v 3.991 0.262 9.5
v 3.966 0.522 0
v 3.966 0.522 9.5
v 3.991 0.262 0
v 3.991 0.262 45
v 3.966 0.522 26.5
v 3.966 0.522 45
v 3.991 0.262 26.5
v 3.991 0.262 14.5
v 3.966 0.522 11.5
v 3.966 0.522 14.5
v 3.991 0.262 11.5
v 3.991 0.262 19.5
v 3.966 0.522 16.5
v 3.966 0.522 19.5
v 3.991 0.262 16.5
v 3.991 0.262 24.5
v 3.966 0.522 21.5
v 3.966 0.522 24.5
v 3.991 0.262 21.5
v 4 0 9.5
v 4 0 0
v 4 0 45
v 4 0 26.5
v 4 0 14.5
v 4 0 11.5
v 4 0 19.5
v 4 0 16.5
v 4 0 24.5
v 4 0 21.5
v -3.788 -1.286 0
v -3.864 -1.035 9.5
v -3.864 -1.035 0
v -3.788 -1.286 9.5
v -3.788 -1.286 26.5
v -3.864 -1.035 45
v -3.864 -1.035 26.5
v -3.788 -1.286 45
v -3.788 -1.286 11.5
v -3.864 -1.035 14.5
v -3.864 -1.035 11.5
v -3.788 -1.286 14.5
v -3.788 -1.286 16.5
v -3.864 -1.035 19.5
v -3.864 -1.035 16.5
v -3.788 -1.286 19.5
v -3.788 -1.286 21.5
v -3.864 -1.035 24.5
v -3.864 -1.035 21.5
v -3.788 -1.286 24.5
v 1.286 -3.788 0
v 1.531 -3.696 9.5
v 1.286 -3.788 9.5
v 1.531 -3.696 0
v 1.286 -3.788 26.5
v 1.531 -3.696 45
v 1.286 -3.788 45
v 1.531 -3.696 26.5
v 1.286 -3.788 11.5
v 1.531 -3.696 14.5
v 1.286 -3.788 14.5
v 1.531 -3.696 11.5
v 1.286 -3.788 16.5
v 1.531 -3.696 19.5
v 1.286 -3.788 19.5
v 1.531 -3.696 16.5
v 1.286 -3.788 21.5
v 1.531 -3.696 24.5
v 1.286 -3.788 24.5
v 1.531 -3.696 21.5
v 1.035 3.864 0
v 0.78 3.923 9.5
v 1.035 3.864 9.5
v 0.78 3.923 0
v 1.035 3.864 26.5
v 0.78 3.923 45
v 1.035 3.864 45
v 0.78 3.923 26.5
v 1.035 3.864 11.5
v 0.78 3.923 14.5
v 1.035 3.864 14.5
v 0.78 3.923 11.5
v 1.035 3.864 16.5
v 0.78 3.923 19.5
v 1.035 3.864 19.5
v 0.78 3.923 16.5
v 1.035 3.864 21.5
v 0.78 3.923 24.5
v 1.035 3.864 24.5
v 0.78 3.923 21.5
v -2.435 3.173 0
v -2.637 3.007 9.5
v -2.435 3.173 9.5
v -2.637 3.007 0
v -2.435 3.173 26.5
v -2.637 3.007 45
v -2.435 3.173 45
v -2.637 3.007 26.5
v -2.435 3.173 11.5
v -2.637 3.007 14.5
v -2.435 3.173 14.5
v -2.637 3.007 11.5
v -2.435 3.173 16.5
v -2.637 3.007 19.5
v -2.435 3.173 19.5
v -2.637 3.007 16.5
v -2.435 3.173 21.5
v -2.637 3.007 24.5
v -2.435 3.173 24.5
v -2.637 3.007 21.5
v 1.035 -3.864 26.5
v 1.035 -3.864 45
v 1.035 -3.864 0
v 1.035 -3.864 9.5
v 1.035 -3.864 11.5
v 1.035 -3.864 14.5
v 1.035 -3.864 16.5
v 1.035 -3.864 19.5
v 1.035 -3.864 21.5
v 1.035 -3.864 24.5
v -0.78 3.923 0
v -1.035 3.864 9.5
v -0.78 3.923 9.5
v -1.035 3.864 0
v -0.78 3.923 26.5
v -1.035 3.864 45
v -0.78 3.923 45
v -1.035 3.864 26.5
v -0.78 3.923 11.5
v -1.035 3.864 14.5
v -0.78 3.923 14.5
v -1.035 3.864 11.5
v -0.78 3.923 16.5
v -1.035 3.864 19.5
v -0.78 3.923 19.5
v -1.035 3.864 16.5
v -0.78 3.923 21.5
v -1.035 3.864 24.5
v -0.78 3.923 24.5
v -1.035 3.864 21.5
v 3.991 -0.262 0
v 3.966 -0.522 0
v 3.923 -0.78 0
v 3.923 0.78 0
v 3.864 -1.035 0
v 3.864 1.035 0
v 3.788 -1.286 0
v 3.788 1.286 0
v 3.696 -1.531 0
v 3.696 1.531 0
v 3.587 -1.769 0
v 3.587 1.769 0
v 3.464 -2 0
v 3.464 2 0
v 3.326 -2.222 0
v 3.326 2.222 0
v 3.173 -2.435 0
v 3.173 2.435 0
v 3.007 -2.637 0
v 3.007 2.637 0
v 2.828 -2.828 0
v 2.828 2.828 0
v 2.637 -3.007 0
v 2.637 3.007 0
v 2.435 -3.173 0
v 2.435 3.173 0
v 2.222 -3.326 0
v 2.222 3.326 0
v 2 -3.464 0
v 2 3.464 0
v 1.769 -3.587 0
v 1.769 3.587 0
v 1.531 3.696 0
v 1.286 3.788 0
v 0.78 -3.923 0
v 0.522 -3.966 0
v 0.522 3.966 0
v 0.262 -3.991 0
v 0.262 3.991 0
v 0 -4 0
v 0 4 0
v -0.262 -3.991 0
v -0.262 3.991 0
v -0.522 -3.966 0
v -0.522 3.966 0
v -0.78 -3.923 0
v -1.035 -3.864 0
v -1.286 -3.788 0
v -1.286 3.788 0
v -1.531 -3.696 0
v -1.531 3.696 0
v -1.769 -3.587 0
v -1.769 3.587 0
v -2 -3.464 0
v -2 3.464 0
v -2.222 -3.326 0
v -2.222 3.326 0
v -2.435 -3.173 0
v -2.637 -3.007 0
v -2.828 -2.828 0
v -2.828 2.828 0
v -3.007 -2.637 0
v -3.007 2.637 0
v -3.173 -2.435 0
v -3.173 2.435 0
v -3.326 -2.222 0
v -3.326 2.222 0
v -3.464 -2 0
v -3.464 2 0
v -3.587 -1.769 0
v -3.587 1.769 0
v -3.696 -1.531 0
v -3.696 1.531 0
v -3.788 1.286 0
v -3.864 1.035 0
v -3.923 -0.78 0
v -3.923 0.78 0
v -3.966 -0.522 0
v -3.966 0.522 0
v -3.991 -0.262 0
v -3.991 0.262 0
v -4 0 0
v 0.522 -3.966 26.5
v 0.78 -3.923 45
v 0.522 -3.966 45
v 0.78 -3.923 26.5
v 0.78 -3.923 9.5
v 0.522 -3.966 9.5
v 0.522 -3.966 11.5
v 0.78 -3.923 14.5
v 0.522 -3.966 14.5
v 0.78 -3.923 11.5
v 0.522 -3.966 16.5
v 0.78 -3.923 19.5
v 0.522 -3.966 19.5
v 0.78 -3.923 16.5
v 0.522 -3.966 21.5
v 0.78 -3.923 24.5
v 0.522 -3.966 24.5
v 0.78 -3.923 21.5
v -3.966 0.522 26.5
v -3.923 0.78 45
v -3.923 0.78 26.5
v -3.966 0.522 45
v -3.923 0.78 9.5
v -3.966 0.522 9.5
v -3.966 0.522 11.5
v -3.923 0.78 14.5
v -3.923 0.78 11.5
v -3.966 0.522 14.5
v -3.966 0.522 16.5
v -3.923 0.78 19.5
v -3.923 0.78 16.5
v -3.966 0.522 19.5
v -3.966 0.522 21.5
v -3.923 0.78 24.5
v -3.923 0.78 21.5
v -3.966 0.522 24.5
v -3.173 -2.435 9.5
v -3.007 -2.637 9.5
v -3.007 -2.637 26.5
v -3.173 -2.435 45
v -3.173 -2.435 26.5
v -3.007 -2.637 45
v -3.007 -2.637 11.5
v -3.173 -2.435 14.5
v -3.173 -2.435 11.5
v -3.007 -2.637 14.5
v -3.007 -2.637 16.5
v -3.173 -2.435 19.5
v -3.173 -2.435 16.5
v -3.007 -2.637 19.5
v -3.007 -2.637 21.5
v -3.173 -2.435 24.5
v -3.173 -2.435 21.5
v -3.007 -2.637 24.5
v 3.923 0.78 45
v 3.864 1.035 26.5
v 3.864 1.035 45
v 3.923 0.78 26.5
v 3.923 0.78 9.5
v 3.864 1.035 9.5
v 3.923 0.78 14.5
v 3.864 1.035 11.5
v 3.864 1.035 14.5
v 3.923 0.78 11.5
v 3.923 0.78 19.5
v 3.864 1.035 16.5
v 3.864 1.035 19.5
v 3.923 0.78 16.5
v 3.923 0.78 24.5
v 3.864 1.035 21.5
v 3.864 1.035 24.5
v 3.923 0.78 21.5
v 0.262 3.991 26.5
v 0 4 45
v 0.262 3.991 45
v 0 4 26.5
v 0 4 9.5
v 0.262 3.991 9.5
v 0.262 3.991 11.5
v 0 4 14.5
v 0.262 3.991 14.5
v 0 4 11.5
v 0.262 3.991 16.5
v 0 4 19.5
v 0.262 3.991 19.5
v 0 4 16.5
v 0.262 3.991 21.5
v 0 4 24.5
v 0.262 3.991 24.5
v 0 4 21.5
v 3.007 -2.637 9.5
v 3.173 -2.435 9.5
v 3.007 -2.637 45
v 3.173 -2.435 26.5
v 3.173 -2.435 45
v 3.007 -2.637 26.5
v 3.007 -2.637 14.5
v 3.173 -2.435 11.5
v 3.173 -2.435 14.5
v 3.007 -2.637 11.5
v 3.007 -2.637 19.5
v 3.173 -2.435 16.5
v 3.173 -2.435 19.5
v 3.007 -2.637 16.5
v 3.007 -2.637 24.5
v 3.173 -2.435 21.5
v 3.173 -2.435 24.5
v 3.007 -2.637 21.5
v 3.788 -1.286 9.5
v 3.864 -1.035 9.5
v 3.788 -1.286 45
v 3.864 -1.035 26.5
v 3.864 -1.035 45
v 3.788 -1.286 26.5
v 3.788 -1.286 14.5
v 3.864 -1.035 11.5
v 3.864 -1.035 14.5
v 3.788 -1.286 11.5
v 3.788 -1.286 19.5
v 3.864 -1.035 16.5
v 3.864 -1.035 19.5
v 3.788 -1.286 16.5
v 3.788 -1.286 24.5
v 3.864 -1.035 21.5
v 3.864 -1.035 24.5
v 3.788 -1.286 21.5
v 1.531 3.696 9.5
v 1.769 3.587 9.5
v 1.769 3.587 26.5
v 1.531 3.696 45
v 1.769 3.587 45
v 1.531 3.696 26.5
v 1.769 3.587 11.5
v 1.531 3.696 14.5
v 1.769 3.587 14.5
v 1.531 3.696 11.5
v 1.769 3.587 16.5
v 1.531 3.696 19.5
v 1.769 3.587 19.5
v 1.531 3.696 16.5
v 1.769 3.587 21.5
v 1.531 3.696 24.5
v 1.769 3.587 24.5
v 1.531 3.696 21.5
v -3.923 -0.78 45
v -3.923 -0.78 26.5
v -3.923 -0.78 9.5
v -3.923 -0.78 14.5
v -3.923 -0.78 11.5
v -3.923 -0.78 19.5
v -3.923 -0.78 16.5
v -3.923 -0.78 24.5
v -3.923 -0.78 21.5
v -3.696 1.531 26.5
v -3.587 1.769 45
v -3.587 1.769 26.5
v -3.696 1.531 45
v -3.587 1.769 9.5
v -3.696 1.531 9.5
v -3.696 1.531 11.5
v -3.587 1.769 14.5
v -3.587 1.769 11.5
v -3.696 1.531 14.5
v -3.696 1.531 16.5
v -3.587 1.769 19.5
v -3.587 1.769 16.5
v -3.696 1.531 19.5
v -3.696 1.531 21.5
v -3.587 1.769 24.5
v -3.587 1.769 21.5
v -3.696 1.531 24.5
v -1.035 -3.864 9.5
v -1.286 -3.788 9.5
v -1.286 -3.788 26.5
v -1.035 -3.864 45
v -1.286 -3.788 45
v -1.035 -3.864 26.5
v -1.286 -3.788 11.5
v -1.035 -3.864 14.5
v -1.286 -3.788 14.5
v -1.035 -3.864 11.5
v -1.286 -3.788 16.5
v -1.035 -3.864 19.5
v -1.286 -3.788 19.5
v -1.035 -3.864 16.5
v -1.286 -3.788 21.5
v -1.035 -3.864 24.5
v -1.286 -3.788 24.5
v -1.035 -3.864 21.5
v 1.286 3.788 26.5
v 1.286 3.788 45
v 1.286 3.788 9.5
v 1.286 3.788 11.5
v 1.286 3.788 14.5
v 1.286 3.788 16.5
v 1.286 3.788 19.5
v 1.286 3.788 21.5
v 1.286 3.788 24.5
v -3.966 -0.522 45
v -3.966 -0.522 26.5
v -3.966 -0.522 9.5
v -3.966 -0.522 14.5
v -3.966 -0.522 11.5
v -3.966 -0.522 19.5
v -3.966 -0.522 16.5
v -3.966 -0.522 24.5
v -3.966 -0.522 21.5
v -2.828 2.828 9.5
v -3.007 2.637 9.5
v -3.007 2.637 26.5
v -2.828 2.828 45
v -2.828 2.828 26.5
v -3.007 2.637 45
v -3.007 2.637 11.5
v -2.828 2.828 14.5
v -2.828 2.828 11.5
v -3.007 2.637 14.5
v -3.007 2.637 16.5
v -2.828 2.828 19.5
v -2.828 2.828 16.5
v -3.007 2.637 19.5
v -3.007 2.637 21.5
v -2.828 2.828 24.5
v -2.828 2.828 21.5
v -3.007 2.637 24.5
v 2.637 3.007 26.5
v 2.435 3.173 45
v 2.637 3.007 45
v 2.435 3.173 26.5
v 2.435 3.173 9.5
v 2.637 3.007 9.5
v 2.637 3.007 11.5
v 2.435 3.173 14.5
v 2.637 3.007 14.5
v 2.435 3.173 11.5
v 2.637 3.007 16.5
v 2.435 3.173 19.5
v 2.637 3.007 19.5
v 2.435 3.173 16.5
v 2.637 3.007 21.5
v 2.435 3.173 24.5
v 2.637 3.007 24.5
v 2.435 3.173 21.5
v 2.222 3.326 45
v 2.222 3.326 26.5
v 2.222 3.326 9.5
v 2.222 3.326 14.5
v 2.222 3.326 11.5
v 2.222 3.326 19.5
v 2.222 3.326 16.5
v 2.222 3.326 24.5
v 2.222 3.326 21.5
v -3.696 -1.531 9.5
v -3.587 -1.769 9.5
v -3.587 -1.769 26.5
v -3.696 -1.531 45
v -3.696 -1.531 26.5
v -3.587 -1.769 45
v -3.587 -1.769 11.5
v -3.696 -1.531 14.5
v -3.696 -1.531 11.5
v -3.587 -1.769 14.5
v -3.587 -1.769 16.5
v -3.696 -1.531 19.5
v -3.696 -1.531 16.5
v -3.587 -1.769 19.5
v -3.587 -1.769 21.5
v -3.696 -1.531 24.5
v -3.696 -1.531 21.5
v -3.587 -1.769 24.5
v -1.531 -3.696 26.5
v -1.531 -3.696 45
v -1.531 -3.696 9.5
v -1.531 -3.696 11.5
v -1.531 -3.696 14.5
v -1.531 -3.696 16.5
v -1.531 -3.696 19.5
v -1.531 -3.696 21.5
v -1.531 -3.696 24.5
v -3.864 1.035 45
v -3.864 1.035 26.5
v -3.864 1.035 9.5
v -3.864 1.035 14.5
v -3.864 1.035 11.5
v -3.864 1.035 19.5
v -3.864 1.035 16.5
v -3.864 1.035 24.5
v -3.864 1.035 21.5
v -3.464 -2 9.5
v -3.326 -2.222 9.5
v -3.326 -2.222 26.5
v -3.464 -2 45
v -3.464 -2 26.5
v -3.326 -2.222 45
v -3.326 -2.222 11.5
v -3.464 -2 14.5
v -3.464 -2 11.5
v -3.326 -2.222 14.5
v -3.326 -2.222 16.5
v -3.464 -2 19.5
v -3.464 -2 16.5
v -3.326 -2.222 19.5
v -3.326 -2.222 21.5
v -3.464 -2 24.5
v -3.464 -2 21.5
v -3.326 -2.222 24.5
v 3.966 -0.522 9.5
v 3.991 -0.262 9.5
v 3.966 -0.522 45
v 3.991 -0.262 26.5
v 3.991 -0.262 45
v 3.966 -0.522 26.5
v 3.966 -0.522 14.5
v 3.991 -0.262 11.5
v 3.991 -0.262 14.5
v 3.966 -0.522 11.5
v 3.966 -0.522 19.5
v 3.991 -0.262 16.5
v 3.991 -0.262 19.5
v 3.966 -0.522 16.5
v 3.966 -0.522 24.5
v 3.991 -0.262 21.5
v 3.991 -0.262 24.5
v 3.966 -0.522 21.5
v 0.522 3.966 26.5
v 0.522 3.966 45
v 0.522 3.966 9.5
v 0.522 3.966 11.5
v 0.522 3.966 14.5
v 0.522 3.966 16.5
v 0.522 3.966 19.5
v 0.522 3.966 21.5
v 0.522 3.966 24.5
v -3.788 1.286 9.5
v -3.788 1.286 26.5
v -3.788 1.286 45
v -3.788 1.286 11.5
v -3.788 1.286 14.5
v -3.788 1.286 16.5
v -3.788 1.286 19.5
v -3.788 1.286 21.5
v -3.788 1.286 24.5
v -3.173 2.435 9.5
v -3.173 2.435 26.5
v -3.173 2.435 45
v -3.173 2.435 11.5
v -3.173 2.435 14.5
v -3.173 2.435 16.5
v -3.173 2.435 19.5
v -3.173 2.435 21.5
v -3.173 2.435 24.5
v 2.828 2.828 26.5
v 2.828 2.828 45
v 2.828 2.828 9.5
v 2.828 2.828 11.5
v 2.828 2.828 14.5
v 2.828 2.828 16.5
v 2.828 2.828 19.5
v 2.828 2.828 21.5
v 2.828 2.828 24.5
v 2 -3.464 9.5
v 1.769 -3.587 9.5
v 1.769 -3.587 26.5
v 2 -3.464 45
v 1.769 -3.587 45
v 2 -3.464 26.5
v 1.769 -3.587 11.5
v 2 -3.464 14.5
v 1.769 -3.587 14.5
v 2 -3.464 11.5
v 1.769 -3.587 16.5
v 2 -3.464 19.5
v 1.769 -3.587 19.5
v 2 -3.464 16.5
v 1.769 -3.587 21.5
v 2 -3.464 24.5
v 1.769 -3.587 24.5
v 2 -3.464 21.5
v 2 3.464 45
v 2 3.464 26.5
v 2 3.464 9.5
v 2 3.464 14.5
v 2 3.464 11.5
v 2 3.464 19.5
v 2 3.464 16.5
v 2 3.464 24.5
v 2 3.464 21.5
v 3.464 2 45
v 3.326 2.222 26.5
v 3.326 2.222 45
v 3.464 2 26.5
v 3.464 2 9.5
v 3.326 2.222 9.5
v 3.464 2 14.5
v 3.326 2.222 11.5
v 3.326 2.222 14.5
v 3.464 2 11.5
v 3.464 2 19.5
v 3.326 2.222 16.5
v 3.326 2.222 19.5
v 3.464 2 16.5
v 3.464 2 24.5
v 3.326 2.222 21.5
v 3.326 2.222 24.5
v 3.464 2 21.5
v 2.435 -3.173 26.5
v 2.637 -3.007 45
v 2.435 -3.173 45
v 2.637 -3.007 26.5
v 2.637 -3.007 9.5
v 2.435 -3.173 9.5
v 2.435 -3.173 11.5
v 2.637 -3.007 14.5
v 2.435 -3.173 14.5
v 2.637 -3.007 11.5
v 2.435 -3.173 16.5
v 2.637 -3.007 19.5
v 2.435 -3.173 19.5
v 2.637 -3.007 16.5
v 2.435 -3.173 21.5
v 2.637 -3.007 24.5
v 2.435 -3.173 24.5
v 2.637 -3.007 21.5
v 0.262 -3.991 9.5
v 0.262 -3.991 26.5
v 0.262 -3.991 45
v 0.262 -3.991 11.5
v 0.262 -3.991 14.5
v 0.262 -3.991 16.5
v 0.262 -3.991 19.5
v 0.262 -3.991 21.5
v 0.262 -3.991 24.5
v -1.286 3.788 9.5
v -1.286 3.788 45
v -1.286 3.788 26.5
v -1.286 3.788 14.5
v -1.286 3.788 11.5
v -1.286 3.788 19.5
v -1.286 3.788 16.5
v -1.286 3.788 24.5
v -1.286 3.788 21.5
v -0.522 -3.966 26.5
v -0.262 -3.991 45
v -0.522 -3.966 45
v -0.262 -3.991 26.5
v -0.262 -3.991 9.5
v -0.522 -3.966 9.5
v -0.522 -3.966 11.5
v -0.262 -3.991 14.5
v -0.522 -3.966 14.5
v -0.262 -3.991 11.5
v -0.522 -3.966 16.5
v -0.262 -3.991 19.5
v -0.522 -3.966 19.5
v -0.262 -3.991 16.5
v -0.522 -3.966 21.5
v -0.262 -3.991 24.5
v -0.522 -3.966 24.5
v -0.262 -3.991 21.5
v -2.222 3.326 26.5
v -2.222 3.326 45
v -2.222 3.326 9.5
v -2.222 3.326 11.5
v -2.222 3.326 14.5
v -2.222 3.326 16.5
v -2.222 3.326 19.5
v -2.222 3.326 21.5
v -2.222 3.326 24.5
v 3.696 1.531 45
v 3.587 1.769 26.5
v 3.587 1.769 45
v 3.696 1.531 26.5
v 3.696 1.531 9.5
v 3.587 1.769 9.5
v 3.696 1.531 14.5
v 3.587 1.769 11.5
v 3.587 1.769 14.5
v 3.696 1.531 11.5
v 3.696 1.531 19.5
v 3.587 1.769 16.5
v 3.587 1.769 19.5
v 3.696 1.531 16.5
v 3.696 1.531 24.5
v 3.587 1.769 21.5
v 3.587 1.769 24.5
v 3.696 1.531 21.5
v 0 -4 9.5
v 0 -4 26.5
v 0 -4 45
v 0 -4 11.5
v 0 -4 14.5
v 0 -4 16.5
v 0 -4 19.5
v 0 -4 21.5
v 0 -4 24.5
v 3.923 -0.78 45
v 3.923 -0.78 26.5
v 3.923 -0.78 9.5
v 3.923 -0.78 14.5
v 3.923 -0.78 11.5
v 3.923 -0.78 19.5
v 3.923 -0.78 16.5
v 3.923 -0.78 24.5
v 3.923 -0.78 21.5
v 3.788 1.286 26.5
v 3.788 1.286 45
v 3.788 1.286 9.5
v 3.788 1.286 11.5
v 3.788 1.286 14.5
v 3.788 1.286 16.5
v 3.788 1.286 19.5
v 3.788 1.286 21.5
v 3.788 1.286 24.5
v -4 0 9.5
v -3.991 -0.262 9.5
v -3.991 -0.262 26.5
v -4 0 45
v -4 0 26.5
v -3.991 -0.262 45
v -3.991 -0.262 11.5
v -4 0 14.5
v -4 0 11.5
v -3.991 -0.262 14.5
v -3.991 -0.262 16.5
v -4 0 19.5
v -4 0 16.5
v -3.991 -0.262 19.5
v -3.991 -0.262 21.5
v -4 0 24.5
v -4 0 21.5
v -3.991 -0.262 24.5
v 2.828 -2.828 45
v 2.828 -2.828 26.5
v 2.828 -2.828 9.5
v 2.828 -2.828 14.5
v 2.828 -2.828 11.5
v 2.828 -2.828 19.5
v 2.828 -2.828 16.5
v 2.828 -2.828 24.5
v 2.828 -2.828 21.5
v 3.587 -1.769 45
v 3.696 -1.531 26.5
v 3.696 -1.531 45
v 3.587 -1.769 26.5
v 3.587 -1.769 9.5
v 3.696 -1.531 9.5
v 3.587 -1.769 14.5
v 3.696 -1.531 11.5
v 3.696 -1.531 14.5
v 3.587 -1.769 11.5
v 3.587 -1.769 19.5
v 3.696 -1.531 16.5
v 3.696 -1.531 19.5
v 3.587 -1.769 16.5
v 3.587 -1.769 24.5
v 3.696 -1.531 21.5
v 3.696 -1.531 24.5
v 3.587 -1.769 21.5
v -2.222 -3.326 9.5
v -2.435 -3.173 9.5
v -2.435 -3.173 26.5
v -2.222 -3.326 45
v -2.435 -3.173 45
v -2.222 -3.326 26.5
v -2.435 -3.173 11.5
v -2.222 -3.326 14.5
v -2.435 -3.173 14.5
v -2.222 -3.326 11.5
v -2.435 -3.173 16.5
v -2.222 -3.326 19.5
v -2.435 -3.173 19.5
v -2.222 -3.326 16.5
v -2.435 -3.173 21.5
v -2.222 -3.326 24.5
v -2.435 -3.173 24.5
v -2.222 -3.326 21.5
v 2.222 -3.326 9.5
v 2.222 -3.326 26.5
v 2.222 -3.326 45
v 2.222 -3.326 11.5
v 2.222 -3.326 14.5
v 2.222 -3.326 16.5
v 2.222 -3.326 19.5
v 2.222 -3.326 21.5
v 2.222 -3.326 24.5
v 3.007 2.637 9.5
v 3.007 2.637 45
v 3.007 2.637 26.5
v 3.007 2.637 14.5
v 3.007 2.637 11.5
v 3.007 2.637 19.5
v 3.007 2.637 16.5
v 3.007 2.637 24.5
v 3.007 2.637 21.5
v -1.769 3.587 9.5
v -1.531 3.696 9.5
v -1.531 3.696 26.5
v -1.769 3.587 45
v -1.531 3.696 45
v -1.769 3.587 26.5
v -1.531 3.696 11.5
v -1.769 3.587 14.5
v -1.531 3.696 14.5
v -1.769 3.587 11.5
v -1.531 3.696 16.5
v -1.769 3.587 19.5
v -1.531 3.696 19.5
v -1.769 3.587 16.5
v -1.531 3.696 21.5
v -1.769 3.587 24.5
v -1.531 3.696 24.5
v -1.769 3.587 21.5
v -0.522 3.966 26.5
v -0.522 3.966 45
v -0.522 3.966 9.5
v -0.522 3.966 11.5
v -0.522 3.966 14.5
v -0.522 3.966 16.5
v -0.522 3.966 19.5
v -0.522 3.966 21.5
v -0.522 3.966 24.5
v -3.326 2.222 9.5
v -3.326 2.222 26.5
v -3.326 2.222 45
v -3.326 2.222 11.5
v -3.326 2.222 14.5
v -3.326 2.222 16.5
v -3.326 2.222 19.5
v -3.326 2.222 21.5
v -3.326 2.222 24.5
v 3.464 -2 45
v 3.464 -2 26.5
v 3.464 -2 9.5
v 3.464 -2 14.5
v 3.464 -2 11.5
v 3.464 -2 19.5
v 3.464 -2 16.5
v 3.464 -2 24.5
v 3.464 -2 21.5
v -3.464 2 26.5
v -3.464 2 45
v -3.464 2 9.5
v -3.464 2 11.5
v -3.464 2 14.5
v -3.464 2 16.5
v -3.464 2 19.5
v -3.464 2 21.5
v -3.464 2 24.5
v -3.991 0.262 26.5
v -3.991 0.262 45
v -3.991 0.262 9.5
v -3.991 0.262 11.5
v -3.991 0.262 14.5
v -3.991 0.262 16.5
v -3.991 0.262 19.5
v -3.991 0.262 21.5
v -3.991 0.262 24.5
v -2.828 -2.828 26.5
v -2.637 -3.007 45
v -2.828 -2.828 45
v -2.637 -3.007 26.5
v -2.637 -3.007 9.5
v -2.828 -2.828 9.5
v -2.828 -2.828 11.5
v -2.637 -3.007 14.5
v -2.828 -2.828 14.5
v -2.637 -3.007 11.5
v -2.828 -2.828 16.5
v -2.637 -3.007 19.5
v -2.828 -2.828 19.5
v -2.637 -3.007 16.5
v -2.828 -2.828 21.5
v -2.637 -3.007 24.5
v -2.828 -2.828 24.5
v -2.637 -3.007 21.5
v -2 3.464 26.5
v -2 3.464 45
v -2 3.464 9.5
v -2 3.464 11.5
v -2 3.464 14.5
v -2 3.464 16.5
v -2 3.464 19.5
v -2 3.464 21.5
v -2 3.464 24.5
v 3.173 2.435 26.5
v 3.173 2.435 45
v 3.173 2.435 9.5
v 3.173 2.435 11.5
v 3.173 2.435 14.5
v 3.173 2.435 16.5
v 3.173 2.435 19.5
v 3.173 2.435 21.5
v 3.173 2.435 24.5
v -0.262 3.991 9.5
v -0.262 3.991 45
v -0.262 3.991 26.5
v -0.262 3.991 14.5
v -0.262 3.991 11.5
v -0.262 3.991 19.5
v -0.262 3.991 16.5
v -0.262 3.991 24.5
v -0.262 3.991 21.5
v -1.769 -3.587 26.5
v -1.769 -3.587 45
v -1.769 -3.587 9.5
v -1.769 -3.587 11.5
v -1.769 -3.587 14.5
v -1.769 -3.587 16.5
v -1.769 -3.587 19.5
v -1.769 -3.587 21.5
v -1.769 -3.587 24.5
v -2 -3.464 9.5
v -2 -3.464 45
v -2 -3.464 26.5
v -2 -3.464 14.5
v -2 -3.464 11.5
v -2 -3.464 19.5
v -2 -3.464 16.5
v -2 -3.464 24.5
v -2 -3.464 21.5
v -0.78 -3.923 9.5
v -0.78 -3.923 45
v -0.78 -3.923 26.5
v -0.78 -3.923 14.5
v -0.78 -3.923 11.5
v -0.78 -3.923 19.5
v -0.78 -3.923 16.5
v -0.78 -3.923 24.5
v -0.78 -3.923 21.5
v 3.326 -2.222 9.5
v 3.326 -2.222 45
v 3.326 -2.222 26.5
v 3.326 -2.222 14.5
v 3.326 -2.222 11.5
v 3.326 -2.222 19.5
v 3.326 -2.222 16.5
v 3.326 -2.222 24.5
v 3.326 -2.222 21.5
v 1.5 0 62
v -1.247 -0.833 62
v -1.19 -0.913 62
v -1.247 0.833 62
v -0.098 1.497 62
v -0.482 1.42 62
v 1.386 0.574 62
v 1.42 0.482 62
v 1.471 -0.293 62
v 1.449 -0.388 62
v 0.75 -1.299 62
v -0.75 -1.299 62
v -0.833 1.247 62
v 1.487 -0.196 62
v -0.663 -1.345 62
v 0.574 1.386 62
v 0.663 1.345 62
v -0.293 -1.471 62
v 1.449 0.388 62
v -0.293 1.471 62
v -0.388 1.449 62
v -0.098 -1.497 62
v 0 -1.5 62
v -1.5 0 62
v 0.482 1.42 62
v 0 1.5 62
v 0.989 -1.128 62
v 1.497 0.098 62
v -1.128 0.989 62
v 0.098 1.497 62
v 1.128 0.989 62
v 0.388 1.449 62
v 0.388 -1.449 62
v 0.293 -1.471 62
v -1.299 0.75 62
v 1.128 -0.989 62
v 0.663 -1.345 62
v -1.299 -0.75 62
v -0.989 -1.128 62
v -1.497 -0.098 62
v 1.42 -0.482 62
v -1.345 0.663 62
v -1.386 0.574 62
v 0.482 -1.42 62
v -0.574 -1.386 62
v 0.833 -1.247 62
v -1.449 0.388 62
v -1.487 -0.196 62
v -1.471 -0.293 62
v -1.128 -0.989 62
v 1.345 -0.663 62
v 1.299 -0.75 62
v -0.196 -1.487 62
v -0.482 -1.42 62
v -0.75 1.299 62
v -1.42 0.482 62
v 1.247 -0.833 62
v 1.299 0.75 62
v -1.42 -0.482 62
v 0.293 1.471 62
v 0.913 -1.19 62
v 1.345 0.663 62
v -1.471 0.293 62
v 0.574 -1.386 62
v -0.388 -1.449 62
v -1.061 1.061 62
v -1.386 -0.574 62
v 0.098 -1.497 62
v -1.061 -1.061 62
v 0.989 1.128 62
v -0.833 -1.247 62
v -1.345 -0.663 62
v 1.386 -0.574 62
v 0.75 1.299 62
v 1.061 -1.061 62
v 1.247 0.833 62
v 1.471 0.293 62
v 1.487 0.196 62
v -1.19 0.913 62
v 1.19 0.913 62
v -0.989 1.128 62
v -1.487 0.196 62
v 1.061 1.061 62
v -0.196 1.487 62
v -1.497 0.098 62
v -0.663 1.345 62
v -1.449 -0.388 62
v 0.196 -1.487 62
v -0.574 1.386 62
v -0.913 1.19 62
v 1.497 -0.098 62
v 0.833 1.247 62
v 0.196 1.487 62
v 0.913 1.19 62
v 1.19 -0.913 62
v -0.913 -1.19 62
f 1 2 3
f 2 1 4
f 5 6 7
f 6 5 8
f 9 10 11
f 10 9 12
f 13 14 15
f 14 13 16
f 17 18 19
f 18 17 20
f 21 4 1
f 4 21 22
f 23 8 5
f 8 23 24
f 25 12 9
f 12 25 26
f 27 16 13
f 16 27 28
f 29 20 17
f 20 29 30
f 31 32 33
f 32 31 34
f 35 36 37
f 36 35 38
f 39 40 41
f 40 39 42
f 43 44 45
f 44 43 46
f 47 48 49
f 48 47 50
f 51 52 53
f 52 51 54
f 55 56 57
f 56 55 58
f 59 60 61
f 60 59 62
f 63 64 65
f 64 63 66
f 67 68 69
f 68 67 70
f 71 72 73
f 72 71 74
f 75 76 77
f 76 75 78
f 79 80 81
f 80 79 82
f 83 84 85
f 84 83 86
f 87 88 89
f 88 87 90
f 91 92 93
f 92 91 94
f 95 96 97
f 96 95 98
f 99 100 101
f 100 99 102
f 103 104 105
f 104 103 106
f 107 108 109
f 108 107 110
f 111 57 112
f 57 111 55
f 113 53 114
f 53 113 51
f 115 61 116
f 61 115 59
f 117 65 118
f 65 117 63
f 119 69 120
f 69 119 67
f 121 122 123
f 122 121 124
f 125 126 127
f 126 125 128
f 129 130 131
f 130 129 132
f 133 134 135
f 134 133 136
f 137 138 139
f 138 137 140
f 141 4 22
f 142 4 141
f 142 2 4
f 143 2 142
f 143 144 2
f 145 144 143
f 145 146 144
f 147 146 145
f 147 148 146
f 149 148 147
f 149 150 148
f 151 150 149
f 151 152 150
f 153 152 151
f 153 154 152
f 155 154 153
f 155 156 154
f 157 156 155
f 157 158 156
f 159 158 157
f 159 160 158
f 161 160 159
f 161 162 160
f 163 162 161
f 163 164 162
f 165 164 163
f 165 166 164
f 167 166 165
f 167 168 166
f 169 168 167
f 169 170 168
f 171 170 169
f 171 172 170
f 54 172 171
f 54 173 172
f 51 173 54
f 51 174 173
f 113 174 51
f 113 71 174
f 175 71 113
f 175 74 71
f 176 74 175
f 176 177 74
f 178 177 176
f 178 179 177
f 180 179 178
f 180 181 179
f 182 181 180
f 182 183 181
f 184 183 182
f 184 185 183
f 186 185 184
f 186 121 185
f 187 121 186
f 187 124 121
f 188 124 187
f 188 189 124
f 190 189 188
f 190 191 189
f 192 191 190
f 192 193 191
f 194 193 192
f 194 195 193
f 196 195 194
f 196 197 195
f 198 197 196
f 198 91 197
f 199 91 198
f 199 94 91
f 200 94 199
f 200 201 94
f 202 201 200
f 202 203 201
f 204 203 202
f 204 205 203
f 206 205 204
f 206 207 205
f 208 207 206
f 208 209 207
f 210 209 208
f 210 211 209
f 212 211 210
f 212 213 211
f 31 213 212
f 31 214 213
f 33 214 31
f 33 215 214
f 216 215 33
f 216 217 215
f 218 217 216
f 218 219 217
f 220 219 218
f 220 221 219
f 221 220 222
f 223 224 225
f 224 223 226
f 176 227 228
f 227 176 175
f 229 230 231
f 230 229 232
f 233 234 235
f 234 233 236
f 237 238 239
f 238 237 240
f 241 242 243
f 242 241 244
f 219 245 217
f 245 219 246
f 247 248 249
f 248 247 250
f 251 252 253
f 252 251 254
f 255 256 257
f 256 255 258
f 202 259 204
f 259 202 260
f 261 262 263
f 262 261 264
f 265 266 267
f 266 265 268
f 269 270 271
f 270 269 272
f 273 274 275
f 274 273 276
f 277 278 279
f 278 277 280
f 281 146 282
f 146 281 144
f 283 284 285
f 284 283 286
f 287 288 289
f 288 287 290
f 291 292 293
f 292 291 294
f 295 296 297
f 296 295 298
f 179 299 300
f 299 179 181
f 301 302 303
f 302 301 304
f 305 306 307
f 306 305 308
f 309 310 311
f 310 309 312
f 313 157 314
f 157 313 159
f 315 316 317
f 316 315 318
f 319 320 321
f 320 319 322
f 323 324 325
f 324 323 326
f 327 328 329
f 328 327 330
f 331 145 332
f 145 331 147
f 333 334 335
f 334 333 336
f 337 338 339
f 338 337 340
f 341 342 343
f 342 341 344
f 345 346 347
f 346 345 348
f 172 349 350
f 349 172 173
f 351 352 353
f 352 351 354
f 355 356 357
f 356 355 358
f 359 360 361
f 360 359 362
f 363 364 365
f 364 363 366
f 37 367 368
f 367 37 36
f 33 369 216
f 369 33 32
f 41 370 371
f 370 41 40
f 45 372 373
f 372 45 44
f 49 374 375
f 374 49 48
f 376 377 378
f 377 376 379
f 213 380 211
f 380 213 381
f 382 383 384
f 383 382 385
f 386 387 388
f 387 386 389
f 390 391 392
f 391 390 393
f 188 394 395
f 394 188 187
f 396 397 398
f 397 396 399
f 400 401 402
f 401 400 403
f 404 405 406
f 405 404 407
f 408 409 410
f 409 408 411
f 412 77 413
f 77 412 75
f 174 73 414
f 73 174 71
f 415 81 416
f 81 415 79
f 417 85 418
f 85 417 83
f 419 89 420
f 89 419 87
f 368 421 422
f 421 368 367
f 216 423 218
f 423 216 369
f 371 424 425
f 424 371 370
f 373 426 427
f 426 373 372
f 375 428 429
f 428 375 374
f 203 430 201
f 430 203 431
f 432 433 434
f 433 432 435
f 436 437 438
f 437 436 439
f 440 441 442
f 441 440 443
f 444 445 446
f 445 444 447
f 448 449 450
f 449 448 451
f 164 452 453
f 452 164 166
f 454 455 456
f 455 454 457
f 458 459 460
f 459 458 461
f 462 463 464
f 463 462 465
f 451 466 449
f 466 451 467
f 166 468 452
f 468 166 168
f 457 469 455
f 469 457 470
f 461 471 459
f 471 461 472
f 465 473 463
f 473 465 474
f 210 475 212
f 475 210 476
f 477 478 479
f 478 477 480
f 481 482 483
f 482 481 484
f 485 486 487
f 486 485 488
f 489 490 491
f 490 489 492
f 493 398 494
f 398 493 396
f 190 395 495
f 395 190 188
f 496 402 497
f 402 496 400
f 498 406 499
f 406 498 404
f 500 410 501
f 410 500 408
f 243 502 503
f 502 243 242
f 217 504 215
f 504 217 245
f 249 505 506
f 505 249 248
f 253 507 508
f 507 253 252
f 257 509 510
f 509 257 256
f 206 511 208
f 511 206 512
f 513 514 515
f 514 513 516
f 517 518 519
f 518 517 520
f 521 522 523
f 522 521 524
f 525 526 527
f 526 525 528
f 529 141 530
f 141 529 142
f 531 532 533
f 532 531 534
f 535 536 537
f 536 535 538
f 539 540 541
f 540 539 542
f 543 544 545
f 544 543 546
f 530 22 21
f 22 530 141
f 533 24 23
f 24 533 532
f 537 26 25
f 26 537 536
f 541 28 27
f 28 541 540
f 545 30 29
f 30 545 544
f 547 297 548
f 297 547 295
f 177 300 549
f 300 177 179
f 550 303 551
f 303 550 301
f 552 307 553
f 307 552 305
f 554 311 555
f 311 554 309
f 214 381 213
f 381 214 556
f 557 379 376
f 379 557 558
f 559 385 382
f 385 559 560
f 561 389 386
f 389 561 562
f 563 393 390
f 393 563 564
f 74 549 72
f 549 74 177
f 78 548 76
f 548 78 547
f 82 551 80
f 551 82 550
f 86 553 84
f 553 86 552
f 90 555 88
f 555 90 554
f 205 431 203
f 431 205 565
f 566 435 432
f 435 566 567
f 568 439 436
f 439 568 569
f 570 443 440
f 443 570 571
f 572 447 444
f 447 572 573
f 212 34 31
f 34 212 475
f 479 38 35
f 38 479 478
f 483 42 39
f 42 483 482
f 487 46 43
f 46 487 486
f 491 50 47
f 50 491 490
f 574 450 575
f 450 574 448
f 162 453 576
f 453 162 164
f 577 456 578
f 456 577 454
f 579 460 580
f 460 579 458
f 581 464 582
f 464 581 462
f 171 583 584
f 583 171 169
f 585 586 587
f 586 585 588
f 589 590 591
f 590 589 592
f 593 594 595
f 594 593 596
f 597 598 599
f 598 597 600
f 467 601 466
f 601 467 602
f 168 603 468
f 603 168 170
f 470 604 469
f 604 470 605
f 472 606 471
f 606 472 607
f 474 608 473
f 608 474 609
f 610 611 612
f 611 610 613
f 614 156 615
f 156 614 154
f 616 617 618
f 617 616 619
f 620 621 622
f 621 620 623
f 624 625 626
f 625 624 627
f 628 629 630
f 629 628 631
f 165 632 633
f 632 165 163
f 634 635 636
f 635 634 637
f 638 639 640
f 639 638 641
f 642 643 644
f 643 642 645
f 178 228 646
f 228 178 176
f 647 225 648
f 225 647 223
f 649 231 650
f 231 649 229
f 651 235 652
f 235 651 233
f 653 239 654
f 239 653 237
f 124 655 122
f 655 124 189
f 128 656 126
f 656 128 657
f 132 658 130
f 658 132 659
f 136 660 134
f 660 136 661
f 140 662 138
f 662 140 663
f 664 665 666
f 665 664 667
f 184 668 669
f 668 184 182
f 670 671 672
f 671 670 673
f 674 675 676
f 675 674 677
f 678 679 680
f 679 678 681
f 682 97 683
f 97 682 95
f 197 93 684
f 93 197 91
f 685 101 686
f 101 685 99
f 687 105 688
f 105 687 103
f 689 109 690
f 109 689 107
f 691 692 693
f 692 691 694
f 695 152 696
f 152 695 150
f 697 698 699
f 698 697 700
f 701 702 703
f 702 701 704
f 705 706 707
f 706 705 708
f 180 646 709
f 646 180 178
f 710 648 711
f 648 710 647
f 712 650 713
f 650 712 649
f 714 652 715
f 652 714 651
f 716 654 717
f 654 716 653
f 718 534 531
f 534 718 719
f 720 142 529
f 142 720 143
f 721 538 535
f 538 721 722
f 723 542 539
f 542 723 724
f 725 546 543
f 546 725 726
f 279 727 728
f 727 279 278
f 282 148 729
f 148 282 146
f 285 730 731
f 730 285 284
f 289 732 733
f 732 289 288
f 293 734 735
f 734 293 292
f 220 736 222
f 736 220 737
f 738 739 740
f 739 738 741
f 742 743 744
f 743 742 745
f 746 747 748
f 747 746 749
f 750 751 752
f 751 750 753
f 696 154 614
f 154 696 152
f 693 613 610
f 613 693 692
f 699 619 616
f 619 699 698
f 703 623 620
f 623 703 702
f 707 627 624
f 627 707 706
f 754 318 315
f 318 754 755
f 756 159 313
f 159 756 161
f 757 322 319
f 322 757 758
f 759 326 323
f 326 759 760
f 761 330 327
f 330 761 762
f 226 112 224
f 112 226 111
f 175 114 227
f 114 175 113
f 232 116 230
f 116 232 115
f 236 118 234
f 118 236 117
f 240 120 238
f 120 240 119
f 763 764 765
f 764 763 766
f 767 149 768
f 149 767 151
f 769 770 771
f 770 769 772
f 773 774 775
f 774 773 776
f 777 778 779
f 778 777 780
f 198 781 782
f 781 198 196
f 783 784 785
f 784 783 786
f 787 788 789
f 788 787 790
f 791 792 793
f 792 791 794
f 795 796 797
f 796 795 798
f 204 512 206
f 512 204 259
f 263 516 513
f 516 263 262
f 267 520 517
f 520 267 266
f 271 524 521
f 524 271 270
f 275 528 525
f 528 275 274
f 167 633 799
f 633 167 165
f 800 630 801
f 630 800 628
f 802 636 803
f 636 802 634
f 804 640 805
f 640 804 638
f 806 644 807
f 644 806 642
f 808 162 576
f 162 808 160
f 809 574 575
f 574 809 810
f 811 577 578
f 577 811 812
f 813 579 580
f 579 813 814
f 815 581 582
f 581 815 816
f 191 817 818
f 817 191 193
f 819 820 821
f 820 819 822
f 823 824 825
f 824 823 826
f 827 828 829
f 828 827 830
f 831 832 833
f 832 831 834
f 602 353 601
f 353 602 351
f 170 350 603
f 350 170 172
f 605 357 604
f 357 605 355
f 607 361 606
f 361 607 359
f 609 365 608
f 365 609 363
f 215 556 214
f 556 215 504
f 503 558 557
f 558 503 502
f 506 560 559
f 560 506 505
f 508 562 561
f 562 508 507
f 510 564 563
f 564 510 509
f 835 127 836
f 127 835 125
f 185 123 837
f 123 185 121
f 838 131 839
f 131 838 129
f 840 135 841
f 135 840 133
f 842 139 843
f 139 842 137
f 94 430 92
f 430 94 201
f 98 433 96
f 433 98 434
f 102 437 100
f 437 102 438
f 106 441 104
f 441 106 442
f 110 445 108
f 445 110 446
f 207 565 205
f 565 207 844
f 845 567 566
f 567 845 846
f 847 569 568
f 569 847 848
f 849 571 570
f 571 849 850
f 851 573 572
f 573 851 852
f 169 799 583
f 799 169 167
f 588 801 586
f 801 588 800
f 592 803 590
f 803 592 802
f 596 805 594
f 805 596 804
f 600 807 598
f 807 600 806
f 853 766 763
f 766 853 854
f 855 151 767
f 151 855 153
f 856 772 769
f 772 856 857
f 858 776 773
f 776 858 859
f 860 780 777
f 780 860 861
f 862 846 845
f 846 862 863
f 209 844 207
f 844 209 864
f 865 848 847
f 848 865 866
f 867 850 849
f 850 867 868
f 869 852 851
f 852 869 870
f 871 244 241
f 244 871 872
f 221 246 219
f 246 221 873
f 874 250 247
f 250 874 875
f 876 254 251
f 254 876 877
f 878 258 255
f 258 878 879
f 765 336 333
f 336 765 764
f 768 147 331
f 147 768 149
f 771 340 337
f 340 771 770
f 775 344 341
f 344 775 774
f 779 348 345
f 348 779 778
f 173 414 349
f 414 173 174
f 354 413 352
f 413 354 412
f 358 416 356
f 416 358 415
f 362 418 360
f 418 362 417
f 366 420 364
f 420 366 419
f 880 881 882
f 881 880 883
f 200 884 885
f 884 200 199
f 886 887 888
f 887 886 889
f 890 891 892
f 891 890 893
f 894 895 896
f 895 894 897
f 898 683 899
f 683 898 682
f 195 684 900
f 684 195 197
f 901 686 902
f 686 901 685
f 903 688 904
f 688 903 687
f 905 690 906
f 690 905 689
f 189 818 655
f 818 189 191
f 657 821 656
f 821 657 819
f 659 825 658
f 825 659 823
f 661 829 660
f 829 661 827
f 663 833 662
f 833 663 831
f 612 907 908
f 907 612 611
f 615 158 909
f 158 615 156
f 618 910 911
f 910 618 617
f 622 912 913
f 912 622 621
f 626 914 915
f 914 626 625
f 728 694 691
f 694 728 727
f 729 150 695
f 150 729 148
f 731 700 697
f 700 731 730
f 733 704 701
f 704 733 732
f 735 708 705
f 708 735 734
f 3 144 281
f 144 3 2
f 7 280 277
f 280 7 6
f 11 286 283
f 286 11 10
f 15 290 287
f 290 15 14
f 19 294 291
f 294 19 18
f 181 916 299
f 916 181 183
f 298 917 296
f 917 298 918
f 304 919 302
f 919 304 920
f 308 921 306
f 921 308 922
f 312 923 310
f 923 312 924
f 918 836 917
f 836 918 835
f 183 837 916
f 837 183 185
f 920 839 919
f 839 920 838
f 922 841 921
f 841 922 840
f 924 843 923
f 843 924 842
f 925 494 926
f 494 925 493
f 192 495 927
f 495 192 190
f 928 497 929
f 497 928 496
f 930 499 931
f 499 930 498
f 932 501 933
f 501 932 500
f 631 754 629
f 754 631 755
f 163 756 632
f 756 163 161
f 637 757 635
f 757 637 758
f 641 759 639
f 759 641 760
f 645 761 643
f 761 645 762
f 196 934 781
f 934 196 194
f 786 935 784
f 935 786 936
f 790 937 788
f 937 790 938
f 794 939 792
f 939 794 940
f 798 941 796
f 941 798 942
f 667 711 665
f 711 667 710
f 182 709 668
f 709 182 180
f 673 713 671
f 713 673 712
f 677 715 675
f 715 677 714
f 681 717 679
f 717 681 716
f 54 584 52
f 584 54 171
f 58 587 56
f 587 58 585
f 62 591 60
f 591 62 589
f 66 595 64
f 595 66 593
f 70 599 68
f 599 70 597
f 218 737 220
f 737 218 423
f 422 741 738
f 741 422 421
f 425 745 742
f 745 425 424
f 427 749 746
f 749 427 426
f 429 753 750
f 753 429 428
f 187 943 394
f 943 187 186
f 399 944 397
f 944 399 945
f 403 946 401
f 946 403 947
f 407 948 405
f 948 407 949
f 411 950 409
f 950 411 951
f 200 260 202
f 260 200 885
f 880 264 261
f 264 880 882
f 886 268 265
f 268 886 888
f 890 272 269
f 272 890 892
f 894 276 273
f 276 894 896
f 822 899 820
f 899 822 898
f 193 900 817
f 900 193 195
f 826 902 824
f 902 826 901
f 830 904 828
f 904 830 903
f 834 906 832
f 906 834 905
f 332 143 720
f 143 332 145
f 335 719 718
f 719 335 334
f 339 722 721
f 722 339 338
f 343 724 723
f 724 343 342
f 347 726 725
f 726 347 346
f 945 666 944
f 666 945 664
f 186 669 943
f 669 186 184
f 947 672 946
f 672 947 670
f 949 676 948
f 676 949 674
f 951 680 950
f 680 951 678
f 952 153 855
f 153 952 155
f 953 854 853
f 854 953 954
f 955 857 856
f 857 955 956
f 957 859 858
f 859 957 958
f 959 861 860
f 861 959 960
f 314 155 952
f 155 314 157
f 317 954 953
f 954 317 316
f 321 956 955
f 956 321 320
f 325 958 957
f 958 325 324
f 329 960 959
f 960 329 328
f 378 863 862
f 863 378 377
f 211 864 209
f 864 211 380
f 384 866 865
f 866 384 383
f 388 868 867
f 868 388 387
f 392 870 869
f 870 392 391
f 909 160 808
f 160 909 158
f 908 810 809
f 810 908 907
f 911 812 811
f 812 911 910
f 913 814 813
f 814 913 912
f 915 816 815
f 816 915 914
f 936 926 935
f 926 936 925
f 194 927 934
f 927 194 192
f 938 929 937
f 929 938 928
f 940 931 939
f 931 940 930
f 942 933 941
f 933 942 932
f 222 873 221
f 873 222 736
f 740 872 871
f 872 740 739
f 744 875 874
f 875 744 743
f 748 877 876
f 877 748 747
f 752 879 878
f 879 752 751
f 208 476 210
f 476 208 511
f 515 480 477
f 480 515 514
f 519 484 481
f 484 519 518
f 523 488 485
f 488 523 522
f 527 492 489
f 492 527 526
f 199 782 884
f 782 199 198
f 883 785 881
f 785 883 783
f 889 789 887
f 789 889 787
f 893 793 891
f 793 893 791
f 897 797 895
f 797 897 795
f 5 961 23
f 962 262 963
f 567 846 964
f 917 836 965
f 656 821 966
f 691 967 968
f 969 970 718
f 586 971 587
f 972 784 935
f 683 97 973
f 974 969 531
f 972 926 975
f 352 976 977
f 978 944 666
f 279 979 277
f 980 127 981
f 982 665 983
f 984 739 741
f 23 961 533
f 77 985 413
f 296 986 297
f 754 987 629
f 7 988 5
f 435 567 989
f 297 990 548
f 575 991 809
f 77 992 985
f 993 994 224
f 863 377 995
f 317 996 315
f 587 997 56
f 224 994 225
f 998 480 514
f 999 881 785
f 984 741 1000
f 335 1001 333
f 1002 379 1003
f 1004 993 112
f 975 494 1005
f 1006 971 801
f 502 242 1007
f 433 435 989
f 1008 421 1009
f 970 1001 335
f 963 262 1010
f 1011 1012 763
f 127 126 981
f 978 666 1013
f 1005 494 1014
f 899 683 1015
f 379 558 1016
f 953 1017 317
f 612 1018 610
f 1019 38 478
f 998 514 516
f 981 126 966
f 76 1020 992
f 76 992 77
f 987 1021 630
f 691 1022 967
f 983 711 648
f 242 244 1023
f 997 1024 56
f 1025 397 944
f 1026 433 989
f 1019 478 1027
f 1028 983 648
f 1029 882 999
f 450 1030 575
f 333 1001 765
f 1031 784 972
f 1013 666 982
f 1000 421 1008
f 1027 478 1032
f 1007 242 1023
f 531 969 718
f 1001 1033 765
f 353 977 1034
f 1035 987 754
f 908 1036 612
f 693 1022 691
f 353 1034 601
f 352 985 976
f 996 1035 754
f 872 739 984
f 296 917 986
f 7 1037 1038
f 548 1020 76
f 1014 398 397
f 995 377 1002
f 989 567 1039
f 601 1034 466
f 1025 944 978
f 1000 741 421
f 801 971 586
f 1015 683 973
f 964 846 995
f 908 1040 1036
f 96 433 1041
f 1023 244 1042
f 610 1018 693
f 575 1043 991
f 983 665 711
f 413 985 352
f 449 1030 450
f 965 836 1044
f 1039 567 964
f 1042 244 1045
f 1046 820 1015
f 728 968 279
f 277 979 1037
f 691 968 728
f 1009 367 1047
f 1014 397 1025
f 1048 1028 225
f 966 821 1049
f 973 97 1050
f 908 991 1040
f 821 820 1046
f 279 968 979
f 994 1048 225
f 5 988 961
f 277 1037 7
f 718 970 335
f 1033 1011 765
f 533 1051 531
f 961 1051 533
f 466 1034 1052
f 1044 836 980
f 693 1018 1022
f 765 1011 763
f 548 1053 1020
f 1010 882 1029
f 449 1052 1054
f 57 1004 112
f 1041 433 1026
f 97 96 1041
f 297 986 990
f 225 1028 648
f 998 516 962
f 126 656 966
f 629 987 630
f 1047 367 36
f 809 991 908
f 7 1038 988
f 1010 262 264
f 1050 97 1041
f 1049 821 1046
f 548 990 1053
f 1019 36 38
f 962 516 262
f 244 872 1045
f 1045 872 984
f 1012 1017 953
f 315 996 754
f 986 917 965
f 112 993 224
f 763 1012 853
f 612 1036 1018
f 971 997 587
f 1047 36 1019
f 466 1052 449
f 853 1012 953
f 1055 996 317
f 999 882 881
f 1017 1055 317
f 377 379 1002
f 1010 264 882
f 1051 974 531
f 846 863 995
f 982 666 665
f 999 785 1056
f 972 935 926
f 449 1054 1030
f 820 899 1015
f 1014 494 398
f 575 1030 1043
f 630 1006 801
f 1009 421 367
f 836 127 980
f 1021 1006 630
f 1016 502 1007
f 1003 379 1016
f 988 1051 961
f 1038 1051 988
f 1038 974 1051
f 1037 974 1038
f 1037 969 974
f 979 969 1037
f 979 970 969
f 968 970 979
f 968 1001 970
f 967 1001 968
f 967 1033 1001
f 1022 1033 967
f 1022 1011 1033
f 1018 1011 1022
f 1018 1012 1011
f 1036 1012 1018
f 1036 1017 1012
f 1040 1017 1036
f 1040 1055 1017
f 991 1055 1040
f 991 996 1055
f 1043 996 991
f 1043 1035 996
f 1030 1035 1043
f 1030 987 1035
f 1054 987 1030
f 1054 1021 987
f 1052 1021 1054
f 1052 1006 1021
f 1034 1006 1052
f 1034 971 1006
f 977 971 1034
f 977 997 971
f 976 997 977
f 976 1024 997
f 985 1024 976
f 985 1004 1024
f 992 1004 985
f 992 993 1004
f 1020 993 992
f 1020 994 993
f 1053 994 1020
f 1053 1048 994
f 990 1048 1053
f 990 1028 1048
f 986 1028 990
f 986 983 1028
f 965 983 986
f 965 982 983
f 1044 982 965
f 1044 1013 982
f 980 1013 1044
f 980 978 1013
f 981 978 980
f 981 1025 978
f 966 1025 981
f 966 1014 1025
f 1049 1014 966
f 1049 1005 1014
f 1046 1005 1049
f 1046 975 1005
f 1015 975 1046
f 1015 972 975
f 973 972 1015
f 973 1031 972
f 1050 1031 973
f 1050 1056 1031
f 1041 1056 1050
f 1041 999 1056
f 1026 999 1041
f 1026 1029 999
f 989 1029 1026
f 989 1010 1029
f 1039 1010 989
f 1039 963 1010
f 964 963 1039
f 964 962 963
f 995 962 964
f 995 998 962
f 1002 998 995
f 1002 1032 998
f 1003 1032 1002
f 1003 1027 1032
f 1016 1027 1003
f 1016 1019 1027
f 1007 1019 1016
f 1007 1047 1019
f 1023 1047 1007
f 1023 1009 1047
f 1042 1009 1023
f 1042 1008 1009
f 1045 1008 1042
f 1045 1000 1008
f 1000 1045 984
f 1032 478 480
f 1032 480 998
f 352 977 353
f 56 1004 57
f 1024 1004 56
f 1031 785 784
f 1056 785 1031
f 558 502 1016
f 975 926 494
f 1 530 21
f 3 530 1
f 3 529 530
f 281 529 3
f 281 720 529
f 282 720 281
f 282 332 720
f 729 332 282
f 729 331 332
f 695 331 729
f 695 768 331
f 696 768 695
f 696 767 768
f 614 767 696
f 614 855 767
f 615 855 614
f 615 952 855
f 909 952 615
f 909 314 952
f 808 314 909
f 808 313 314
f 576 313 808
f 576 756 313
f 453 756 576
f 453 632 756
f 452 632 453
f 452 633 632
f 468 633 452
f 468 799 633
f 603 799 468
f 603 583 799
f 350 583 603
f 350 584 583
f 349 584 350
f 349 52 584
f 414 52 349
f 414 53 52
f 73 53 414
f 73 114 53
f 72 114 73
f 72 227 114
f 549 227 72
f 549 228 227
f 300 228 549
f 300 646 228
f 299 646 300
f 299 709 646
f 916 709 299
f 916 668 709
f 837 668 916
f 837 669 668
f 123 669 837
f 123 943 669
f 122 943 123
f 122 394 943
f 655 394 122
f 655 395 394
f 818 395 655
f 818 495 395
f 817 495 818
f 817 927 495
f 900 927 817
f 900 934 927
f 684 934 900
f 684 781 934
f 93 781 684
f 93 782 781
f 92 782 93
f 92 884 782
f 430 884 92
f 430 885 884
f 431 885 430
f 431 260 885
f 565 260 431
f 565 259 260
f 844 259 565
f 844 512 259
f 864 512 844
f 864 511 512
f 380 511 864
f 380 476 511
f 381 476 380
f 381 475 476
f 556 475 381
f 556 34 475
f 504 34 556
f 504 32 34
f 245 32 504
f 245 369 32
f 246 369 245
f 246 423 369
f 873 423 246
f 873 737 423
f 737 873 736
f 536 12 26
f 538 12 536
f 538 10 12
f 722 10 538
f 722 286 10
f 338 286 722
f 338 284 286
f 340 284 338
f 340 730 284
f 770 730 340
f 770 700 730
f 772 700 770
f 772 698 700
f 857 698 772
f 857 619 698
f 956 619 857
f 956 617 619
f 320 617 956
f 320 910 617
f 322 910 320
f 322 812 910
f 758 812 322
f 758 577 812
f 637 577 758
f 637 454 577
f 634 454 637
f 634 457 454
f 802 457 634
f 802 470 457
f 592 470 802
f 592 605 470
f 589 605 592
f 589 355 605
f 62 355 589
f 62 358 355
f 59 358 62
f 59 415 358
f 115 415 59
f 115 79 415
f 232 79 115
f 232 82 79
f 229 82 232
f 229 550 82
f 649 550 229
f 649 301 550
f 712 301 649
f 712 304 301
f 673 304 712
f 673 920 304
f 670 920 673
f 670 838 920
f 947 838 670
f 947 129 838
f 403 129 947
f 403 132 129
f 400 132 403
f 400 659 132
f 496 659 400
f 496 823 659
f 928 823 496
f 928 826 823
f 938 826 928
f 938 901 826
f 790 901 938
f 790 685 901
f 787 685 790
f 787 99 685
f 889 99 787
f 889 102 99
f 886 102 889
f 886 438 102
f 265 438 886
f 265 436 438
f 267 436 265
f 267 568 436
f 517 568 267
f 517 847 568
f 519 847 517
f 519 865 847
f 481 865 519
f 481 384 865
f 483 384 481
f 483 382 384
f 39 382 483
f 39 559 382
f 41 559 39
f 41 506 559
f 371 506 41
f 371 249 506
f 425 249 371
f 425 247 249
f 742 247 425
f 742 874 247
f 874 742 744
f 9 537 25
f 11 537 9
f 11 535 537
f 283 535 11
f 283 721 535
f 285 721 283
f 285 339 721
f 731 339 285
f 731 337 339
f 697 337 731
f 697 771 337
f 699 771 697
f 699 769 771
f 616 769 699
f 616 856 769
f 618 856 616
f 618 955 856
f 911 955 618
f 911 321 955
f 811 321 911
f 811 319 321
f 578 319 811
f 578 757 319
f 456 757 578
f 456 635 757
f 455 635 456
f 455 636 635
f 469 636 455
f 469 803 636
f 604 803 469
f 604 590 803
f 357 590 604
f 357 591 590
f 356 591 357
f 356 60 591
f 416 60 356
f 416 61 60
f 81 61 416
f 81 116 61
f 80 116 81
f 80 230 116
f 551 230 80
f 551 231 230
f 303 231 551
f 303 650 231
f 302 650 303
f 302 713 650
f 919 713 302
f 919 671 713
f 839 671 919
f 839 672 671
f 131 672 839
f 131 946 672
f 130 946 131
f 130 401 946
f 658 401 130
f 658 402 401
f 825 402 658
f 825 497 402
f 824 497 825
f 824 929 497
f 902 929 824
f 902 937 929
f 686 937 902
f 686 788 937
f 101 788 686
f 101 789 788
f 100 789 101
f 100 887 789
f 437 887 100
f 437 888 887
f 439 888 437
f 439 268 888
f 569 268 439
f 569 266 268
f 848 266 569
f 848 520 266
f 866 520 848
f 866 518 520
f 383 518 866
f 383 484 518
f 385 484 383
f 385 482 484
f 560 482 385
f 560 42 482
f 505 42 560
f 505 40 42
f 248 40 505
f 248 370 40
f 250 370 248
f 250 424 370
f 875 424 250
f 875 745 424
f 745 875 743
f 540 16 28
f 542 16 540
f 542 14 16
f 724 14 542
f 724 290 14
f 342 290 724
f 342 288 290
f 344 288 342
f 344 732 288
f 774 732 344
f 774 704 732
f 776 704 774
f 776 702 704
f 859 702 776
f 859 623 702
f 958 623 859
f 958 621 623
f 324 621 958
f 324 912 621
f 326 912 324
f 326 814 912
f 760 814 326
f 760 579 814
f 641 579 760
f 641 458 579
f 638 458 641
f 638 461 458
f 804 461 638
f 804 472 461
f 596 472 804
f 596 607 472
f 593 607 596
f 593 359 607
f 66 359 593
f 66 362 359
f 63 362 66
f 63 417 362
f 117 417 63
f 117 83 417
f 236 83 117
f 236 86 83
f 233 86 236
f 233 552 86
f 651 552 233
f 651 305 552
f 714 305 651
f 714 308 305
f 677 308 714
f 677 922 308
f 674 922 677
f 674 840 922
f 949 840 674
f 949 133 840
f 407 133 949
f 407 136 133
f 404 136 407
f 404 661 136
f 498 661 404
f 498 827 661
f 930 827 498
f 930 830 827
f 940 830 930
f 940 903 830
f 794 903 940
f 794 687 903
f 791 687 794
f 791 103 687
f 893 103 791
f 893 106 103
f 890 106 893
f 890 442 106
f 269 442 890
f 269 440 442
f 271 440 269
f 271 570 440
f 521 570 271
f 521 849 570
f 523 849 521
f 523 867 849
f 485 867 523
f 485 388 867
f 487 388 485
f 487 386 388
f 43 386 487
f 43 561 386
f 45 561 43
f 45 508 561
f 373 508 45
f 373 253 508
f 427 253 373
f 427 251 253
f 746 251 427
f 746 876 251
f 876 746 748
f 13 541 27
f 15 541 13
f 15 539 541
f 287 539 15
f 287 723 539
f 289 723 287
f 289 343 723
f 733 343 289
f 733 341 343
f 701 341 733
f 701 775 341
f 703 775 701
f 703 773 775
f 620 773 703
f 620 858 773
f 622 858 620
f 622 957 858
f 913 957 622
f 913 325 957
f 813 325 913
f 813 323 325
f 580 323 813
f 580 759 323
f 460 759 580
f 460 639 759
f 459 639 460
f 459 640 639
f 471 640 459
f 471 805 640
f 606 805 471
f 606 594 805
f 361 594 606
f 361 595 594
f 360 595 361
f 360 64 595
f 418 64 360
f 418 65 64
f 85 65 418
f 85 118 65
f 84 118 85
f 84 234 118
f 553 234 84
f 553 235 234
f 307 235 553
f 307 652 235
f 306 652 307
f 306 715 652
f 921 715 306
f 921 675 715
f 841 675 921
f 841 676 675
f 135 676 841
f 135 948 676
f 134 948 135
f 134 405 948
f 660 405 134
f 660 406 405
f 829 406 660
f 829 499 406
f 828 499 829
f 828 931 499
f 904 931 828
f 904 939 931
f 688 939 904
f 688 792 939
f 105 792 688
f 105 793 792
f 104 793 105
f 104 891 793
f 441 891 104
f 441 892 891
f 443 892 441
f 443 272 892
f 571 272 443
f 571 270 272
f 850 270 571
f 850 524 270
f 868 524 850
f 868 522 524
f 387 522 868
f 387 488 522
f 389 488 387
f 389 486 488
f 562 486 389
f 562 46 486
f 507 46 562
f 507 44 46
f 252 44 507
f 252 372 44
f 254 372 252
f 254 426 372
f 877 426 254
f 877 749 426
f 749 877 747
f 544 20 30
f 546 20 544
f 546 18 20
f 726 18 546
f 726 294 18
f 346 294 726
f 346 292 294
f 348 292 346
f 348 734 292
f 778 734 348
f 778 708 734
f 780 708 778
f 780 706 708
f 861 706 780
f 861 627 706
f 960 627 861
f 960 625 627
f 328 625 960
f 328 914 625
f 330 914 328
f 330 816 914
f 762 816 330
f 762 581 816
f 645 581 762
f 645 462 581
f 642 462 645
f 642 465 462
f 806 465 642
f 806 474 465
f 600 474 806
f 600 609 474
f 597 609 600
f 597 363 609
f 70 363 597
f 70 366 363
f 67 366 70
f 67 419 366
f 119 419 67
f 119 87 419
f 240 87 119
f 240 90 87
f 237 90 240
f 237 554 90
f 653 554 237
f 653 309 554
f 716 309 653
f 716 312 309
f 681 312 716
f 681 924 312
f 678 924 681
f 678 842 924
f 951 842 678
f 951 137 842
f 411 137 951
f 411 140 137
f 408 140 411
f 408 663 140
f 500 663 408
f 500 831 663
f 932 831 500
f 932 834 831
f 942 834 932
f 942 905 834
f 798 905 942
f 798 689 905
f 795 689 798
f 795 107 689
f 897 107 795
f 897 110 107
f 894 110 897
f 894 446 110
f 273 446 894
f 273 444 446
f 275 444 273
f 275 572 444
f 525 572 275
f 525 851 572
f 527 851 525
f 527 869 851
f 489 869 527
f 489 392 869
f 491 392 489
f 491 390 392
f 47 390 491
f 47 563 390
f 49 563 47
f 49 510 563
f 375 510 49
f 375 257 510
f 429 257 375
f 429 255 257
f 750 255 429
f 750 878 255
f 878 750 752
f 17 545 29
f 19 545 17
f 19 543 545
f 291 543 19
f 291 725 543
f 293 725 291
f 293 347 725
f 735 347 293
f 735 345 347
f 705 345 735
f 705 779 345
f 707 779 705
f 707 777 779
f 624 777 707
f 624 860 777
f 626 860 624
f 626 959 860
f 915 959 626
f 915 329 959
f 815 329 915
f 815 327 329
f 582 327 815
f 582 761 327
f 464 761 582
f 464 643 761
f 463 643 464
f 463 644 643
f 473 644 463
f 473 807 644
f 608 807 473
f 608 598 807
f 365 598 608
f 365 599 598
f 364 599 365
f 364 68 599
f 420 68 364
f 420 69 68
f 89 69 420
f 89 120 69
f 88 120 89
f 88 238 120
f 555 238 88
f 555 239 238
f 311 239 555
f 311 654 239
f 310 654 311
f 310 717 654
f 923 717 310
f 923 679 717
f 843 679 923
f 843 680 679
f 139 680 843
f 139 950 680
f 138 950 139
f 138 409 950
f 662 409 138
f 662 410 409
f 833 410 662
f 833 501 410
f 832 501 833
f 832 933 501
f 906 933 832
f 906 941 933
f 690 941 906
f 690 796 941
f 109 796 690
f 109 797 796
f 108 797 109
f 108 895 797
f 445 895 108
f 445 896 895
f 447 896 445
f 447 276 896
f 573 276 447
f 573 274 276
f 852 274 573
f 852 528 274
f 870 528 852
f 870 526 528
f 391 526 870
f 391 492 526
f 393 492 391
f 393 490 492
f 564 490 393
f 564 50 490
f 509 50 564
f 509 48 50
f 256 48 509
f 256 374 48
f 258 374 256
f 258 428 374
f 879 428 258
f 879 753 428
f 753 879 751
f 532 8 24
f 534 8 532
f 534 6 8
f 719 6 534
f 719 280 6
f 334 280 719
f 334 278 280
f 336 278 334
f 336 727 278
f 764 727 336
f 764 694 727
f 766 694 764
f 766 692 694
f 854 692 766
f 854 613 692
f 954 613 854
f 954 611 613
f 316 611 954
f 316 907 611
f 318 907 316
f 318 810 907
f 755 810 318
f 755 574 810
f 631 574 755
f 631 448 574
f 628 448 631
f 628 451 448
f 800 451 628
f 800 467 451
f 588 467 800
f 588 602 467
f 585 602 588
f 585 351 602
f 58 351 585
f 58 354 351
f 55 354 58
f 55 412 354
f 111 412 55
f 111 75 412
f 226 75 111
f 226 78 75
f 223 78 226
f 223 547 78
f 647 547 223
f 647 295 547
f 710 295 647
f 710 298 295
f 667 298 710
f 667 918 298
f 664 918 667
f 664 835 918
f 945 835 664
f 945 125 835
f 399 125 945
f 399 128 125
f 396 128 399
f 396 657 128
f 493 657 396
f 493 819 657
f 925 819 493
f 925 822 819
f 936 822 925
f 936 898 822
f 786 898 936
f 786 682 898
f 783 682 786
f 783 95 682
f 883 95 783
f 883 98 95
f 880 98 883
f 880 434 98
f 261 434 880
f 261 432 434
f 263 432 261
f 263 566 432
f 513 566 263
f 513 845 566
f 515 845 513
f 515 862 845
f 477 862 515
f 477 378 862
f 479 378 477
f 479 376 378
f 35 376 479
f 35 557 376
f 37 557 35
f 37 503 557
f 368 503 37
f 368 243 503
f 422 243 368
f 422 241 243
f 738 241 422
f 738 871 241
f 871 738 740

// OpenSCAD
// Pestle for grinding tissue inside a 1.5 mL microcentrifuge tube
// Print orientation: standing upright on the XY plane, building up +Z

// ---------------- Parameters ----------------
handle_d      = 8;    // handle diameter (mm), z = 0 to 45
handle_h      = 45;   // handle height (mm)
cone_d_top    = 8;    // cone diameter at top (mm), z = 45
cone_d_tip    = 3;    // cone diameter at tip (mm), z = 62
cone_h        = 17;   // cone height (mm), 45 to 62
tip_r         = 1.5;  // tip sphere radius (mm), centre z = 62
tip_h         = 3;    // tip height above centre (mm)

groove_count  = 4;    // number of circumferential grooves
groove_w      = 2;    // groove width (mm), in Z
groove_d      = 1;    // groove depth (mm)
groove_z      = [10, 15, 20, 25]; // groove centre heights (mm)

eps           = 0.5;  // cutter overshoot past faces (mm)
$fn           = 96;   // curve resolution

// ---------------- Model ----------------
difference() {
    union() {
        // (1) Cylindrical handle
        cylinder(d = handle_d, h = handle_h);

        // (2) Tapering cone, 8 mm at z = 45 to 3 mm at z = 62
        translate([0, 0, handle_h])
            cylinder(d1 = cone_d_top, d2 = cone_d_tip, h = cone_h);

        // (3) Rounded tip: 3 mm diameter sphere centred at z = 62
        translate([0, 0, cone_h + tip_r])
            sphere(r = tip_r);
    }

    // Grip grooves, each extending past the bottom face
    for (g = [0 : groove_count - 1]) {
        translate([0, 0, groove_z[g] - eps])
            cylinder(d = handle_d + 2 * eps, h = groove_w, $fn = 64);
    }
}
